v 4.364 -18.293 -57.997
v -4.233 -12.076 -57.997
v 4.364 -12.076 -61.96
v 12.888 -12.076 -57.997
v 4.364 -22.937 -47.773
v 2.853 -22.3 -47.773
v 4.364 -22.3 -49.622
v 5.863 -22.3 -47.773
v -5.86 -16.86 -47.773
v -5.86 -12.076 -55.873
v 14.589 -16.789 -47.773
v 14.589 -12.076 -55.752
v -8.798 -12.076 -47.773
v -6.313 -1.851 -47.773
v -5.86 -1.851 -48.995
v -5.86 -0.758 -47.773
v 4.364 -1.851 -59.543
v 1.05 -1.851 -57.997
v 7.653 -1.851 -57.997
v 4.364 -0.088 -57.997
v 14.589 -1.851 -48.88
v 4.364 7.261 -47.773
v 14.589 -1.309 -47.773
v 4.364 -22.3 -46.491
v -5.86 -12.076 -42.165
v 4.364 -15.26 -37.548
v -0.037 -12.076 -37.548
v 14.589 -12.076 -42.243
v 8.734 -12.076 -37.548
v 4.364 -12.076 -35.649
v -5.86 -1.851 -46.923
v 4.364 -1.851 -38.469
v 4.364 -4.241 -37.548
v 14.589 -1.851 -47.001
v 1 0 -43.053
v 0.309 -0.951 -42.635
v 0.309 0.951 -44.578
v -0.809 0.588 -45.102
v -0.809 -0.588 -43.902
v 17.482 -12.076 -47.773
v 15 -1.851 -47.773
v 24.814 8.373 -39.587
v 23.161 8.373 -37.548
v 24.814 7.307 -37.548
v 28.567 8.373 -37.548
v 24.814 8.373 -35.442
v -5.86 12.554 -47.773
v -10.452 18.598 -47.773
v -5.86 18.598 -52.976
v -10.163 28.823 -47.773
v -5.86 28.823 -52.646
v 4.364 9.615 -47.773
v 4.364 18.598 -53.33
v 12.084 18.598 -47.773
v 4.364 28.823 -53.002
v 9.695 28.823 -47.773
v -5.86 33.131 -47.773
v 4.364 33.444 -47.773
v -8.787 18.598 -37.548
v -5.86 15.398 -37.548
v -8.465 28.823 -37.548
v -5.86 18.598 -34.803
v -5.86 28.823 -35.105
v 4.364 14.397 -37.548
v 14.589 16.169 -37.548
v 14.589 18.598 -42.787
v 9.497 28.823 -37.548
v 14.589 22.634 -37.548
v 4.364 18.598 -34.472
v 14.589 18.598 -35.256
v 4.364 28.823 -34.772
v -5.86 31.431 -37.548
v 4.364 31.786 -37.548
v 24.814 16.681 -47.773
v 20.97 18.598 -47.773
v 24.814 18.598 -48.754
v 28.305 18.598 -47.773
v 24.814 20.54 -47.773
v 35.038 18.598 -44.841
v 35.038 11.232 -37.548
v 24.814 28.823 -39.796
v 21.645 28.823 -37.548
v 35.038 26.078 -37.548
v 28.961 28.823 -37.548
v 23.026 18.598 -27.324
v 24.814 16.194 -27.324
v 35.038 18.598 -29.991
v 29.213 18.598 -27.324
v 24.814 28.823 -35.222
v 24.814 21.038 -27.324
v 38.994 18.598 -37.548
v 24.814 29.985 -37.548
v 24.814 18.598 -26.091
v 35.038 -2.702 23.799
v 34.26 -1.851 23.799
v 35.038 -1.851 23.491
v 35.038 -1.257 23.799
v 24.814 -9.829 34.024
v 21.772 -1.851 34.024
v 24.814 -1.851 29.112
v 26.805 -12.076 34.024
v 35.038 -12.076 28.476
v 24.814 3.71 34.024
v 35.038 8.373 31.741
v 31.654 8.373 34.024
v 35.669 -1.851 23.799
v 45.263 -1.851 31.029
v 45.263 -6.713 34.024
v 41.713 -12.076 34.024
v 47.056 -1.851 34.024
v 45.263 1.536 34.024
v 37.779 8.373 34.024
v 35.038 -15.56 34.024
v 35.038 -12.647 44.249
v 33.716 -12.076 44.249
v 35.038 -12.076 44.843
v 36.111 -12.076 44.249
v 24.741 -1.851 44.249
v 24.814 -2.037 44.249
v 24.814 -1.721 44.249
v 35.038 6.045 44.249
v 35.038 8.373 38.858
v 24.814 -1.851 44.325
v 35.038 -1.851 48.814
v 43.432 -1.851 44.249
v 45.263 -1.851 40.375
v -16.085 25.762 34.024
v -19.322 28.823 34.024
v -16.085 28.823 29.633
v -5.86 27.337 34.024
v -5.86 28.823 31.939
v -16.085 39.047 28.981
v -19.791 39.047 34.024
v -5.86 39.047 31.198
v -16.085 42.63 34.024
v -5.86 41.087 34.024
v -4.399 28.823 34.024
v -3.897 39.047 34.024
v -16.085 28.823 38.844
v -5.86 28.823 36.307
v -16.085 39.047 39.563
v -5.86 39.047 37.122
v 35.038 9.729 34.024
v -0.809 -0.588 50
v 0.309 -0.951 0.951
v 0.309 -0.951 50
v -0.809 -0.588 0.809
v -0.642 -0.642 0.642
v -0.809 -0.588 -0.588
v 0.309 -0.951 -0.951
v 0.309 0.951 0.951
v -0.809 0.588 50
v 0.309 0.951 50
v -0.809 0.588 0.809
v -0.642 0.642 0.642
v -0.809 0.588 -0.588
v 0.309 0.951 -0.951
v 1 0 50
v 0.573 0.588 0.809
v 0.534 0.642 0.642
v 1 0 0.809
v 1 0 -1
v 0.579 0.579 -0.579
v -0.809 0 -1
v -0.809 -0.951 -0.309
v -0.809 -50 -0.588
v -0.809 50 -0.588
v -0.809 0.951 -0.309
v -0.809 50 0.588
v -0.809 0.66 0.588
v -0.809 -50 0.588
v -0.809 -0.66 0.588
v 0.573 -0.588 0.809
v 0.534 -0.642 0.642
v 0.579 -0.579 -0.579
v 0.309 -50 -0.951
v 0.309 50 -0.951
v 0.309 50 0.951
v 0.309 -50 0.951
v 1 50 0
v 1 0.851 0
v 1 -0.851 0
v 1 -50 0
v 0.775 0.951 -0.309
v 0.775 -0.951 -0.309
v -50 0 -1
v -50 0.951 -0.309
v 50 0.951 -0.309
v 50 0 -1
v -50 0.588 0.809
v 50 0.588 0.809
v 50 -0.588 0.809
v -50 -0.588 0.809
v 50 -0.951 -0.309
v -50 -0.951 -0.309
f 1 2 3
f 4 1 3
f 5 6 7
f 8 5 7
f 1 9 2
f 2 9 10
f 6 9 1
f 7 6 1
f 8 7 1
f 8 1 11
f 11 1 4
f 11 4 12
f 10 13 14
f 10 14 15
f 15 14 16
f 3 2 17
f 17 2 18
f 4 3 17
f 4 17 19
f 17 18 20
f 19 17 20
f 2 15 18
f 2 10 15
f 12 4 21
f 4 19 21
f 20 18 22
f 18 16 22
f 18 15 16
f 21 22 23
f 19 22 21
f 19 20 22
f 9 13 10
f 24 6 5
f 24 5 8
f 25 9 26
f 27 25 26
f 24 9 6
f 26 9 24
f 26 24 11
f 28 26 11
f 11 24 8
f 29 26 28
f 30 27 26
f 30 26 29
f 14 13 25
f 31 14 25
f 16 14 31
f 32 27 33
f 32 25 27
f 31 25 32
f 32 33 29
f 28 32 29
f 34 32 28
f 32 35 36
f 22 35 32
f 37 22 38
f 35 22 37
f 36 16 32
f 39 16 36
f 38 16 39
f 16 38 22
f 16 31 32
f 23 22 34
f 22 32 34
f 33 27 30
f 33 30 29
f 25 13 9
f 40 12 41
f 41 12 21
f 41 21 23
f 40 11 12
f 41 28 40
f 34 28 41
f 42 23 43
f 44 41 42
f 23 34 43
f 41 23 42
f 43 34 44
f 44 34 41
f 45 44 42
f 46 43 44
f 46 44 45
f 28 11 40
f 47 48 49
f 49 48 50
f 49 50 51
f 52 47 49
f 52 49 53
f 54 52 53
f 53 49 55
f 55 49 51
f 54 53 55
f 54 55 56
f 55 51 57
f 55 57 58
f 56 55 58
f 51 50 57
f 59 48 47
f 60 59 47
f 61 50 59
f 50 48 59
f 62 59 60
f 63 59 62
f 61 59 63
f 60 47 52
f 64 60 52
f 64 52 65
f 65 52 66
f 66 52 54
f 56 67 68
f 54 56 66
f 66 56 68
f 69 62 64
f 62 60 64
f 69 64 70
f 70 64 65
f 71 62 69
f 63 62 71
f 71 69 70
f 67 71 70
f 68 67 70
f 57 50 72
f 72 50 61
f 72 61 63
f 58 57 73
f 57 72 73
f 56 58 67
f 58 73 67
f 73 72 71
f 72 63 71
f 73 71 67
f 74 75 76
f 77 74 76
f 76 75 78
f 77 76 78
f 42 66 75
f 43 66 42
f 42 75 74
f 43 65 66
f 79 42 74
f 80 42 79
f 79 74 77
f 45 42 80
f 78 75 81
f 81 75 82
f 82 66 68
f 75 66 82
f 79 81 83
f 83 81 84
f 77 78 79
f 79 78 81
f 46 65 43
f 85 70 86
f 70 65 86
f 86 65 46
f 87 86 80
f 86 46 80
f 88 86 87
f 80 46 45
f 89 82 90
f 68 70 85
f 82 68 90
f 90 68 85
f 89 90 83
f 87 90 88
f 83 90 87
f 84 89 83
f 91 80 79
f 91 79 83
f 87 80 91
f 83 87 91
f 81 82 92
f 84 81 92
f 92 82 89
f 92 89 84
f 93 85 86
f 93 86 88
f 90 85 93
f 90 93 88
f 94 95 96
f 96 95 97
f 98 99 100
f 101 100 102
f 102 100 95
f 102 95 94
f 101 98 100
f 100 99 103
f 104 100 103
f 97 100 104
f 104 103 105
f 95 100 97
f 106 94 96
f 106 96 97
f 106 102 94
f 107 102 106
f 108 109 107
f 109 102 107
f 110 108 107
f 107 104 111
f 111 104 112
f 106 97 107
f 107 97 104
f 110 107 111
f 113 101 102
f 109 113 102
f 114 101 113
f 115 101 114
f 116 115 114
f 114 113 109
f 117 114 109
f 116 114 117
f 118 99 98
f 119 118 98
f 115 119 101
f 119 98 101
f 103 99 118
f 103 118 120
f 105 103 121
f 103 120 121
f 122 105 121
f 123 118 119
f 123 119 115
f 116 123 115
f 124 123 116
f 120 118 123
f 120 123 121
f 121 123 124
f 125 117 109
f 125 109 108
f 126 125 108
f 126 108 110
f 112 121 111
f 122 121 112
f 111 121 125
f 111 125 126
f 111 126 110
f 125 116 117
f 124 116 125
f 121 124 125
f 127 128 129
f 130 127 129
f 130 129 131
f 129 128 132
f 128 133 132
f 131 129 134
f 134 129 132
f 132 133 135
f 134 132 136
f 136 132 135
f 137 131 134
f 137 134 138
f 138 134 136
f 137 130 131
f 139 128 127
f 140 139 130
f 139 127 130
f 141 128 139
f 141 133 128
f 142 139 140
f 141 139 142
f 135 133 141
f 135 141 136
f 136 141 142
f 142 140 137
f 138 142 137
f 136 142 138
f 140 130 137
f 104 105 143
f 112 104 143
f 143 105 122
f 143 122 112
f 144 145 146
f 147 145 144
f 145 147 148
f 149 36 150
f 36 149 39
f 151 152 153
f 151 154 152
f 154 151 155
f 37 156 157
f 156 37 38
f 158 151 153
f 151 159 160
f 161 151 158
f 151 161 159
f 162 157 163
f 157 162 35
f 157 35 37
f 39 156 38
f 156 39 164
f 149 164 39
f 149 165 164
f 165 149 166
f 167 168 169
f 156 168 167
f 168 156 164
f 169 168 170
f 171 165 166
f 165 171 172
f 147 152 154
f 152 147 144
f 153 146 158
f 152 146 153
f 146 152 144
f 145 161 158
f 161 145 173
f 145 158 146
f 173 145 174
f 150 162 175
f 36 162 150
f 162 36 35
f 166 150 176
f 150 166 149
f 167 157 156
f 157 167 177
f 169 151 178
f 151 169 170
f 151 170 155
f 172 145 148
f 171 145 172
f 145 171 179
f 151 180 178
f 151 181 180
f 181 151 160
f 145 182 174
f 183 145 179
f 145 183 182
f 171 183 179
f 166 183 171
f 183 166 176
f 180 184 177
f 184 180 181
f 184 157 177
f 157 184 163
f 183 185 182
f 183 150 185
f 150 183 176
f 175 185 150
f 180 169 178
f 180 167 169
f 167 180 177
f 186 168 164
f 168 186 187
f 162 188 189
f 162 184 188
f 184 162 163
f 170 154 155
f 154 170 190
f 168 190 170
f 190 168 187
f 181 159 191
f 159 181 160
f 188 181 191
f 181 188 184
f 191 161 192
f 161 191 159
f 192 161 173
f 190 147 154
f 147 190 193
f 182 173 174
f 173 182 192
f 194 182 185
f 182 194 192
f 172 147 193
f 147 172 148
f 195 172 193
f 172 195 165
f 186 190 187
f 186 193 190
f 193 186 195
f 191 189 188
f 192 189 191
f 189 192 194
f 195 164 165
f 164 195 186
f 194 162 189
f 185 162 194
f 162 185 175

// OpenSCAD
/*
SomeBalls.scad
Public Domain Code
Based on Metaballs By: William A Adams 	4 June 2011

This code is a simplified implementation of the 'metaball' and uses "Marching Cubes" to register the isosurface which is the interaction of the various balls. All Cubes are tested and a joint hull is generated of each corner that lies inside the threshold  of the metaball 



*/
Resolution = 1;//[5:5:50]
MinSubdivisions=0;//[2:1:10] 
MaxSubdivisions=5;//[2:1:10] 

// Smaller number larger blob


Diagnostic=false
;
Diagnostic2=false;

Oversize=0.2;
// List Format [[x,y,z,r],[x,y,z,r]]
//MyBallList=[[0, 0, 0, 15]];//Threshold = 1.95
balls=5;

kernel=20;
Thresh1 = 0.5;
bulb=kernel/(Thresh1);

echo(Thresh1,bulb);
MyBallList=[ for(i=[0:balls-1])Lotto(bulb)];
cylinder(100,1,1,center=true);
rotate([90,0,0])cylinder(100,1,1,center=true);
rotate([0,90,0])cylinder(100,1,1,center=true);





DrawMetaballs(MyBallList,Thresh1);
//color(rndc())for(i=[0:8]){translate([rands(0, 125, 1)[0],rands(15, 30, 1)[0],rands(15, 35, 1)[0]])rotate([0,90,0])sphere(20,$fn=12);}


module DrawMetaballs(BallList,Threshold) {
     ColorList = [ for(i=[0:len(BallList)])lim31(1,rndc()) ];
  if (Diagnostic2){for(i=[0:len(BallList)-1]){

      
 color("Blue",0.1) % translate([BallList[i][0],BallList[i][1],BallList[i][2]])  sphere(BallList[i][3]);
     
//color("RED",0.5) # translate([BallList[i][0],BallList[i][1],BallList[i][2]])  sphere(BallList[i][3]*Thresh1);
     }} 
 
// boundary plus some extra
x=findMin(BallList, 0);
y= findMin(BallList, 1);
 z=findMin(BallList, 2);
 mx=findMax(BallList, 0);
my= findMax(BallList, 1);
 mz=findMax(BallList, 2);
size=max(mx-x,my-y,mz-z)*(1+Oversize);
sx=x+(mx-x)/2-size/2;
 sy=y+(my-y)/2-size/2;
 sz=z+(mz-z)/2-size/2;
  //   %translate([x+(mx-x)/2,y+(my-y)/2,z+(mz-z)/2])cube(size,center=true);
DrawSubMetaballs(BallList,ColorList,Threshold,[[[0,0,0],0]],sx,sy,sz,size); 
    


 }
module DrawSubMetaballs(BallList,ColorList,Threshold,cache,x,y,z,Size,i=1) {    
  //  echo(i,Size);
 h=Size*0.5  ;
echo(search (cache,[x,y,z]));
suma =  BallField3D(x, y, z, BallList, len(BallList) - 1) ;
sumb =  BallField3D(x + Size, y, z, BallList, len(BallList) - 1) ;
sumc =  BallField3D(x, y + Size, z, BallList, len(BallList) - 1) ;
sumd =  BallField3D(x + Size, y + Size, z, BallList, len(BallList) - 1) ;
sume =  BallField3D(x, y, z + Size, BallList, len(BallList) - 1) ;
sumf =  BallField3D(x + Size, y, z + Size, BallList, len(BallList) - 1) ;
sumg =  BallField3D(x, y + Size, z + Size, BallList, len(BallList) - 1) ;
sumh =  BallField3D(x + Size, y + Size, z + Size, BallList, len(BallList) - 1) ;
sumcolor =lim31(1, ColorField3D(x, y, z, BallList,ColorList, len(BallList) - 1));
summin=max(
    abs(suma-Threshold),
    abs(sumb-Threshold),
    abs(sumc-Threshold),
    abs(sumd-Threshold),
    abs(sume-Threshold),
    abs(sumf-Threshold),
    abs(sumg-Threshold),
    abs(sumh-Threshold));
    
    sumsig=(sign(suma-Threshold)+
    sign(sumb-Threshold)+
    sign(sumc-Threshold)+
    sign(sumd-Threshold)+
    sign(sume-Threshold)+
    sign(sumf-Threshold)+
    sign(sumg-Threshold)+
    sign(sumh-Threshold));

    




if (  sumsig==-8&&summin>(1.3)/sqrt(2+i)&&i>MinSubdivisions) {if (Diagnostic&&z<0){echo (i,sumsig,summin,(1.3)/sqrt(2+i));translate([x, y, z]) %cube(Size);}} 
else if (  sumsig==8&&i>MinSubdivisions){
translate([x, y, z])  color(sumcolor) cube(Size);} 


else if(i<MaxSubdivisions ){ 
    h=Size*0.5  ;
    DrawSubMetaballs(BallList,ColorList,Threshold,cache,x,y,z,h,i+1);
    DrawSubMetaballs(BallList,ColorList,Threshold,cache,x+h,y,z,h,i+1);
    DrawSubMetaballs(BallList,ColorList,Threshold,cache,x,y+h,z,h,i+1);
    DrawSubMetaballs(BallList,ColorList,Threshold,cache,x+h,y+h,z,h,i+1);
    
    DrawSubMetaballs(BallList,ColorList,Threshold,cache,x,y,z+h,h,i+1);
    DrawSubMetaballs(BallList,ColorList,Threshold,cache,x+h,y,z+h,h,i+1);
    DrawSubMetaballs(BallList,ColorList,Threshold,cache,x,y+h,z+h,h,i+1);
    DrawSubMetaballs(BallList,ColorList,Threshold,cache,x+h,y+h,z+h,h,i+1);}
else { 

    // For every corner inside treshold make and mirror a corner piece, hull the lot.
   //echo
    //color(rndc())
    color(sumcolor)
    hull(){
        
        sab=inter(suma,sumb,Threshold)*Size;
sac=inter(suma,sumc,Threshold)*Size;
sae=inter(suma,sume,Threshold)*Size;
sba=inter(sumb,suma,Threshold)*Size;
sbd=inter(sumb,sumd,Threshold)*Size;
sbf=inter(sumb,sumf,Threshold)*Size;
sca=inter(sumc,suma,Threshold)*Size;
scd=inter(sumc,sumd,Threshold)*Size;
scg=inter(sumc,sumg,Threshold)*Size;
sdb=inter(sumd,sumb,Threshold)*Size;
sdc=inter(sumd,sumc,Threshold)*Size;
sdh=inter(sumd,sumh,Threshold)*Size;
sea=inter(sume,suma,Threshold)*Size;
seg=inter(sume,sumg,Threshold)*Size;
sef=inter(sume,sumf,Threshold)*Size;
sfh=inter(sumf,sumh,Threshold)*Size;
sfe=inter(sumf,sume,Threshold)*Size;
sfb=inter(sumf,sumb,Threshold)*Size;
sge=inter(sumg,sume,Threshold)*Size;
sgh=inter(sumg,sumh,Threshold)*Size;
sgc=inter(sumg,sumc,Threshold)*Size;
shg=inter(sumh,sumg,Threshold)*Size;
shf=inter(sumh,sumf,Threshold)*Size;
shd=inter(sumh,sumd,Threshold)*Size;
if (suma > Threshold){    translate([x, y, z])  Corner(sab,sac,sae);}
if (sumb > Threshold){    translate([x + Size, y, z])  Corner(-sba,sbd,sbf);}
if (sumc > Threshold){  translate([x, y + Size, z])  Corner(scd,-sca,scg);}
if (sumd > Threshold){    translate([x + Size, y + Size, z]) Corner(-sdc,-sdb,sdh);}
    
if (sume > Threshold){   translate([x, y, z + Size])  Corner(sef,seg,-sea);}
if (sumf > Threshold){   translate([x + Size, y, z + Size])  Corner(-sfe,sfh,-sfb);}
if (sumg > Threshold){    translate([x, y + Size, z + Size])  Corner(sgh,-sge,-sgc);}
if (sumh > Threshold){    translate([x + Size, y + Size, z + Size]) Corner(-shg,-shf,-shd);}
}
    }
}

//}




//Corner piece
module Corner(u=0.5,v=0.5,w=0.5) {scale([u,v,w])
polyhedron
    (points = [	       [0,0,0],[1,0,0],[0,1,0],[0,0,1],],      faces = [		  [0,0,1],[0,0,2],[0,0,3],[1,2,3]
		  ]
     );}
     
     function lim31(l, v) = v / len3(v) * l;
     function len3(v) = sqrt(pow(v[0], 2) + pow(v[1], 2) + pow(v[2], 2));
// Random color

function Lotto(i) =lim31(50, [rands(-75,75, 1)[0],rands(-75, 75, 1)[0],(SC3(rands(0,1, 1)[0])-0.5)*150,i]);

//Field function
     function ColorField3D(x, y, z, BallSack,Colorsack, i) = (i == 0) ? Powercolor(x, y, z, BallSack[0])*Colorsack[0]: Powercolor(x, y, z, BallSack[i])*Colorsack[i] + ColorField3D(x, y, z, BallSack,Colorsack, i - 1);

function Powercolor(x, y, z, Ball) = max(

SC3((Ball[3]-( len3([x - Ball[0], y - Ball[1] , z - Ball[2]]))) /Ball[3]),
0,
((1/(      len3([x - Ball[0], y - Ball[1] , z - Ball[2]])/0.1 +1)))

)  ;
function Proxyball(x, y, z, Ball) = (abs(x - Ball[0])  + abs(y - Ball[1]) + abs(z - Ball[2]) );
     
function Powerball(x, y, z, Ball) =max(

SC3((Ball[3]-( len3([x - Ball[0], y - Ball[1] , z - Ball[2]]))) /Ball[3]),
0,
((1/(      len3([x - Ball[0], y - Ball[1] , z - Ball[2]])/0.1 +1)))

)  ;

 //function Powerball(x, y, z, Ball) = min(SC3(Ball[3]/abs(x - Ball[0])),SC3(Ball[3]/abs(y - Ball[1])),SC3(Ball[3]/abs(z - Ball[2]))) ;
//function Powerball(x, y, z, Ball) =Ball[3]/  ( (abs(x - Ball[0])  + abs(y - Ball[1])  + abs(z - Ball[2]))/2.5);
// Recursive Field Evaluation
function BallField3D(x, y, z, BallSack, i) = (i == 0) ? Powerball(x, y, z, BallSack[0]): Powerball(x, y, z, BallSack[i]) + BallField3D(x, y, z, BallSack, i - 1);
  //   function BallField3D(x, y, z, BallSack, i) = (i == 0) ? Powerball(x, y, z, BallSack[0]): max(Powerball(x, y, z, BallSack[i]) , BallField3D(x, y, z, BallSack, i - 1));
     
     
 function Ballprox3D(x, y, z, BallSack, i) = (i == 0) ? Proxyball(x, y, z, BallSack[0]): smin(Proxyball(x, y, z, BallSack[i]) , Ballprox3D(x, y, z, BallSack, i - 1));
function rndc() = [round(rands(0, 2, 1)[0])/2, round(rands(0, 2, 1)[0])/2, round(rands(0, 2, 1)[0])/2];
     //interpolate
function inter(t,r,Threshold)=(t==r)?1:(t>Threshold)?(r<Threshold)? abs(Threshold-t)/abs(t-r) :0 :(r>Threshold)? abs(Threshold-t)/abs(t-r) :1 ;
// Recursive find min/max extremes
function findMax(v, select, i = 0) = ((i + 1) < len(v)) ? max(v[i][select] + (v[i][3]) , findMax(v, select, i + 1)): v[i][select] + (v[i][3]) ;
function findMin(v, select, i = 0) = ((i + 1) < len(v)) ? min(v[i][select] - (v[i][3]) , findMin(v, select, i + 1)): v[i][select] - (v[i][3]);
function SC3 (a)= let( b=clamp(a))(b * b * (3 - 2 * b));

function clamp (a,b=0,c=10)=min(max(a,b),c);

function mix(a,b,h)=a*h+b*(1-h);function smin( a, b, k=0.2 )
=let( h = clamp( 0.5+0.5*(b-a)/k, 0.0, 1.0 ))mix( b, a, h ) - k*h*(1.0-h);
